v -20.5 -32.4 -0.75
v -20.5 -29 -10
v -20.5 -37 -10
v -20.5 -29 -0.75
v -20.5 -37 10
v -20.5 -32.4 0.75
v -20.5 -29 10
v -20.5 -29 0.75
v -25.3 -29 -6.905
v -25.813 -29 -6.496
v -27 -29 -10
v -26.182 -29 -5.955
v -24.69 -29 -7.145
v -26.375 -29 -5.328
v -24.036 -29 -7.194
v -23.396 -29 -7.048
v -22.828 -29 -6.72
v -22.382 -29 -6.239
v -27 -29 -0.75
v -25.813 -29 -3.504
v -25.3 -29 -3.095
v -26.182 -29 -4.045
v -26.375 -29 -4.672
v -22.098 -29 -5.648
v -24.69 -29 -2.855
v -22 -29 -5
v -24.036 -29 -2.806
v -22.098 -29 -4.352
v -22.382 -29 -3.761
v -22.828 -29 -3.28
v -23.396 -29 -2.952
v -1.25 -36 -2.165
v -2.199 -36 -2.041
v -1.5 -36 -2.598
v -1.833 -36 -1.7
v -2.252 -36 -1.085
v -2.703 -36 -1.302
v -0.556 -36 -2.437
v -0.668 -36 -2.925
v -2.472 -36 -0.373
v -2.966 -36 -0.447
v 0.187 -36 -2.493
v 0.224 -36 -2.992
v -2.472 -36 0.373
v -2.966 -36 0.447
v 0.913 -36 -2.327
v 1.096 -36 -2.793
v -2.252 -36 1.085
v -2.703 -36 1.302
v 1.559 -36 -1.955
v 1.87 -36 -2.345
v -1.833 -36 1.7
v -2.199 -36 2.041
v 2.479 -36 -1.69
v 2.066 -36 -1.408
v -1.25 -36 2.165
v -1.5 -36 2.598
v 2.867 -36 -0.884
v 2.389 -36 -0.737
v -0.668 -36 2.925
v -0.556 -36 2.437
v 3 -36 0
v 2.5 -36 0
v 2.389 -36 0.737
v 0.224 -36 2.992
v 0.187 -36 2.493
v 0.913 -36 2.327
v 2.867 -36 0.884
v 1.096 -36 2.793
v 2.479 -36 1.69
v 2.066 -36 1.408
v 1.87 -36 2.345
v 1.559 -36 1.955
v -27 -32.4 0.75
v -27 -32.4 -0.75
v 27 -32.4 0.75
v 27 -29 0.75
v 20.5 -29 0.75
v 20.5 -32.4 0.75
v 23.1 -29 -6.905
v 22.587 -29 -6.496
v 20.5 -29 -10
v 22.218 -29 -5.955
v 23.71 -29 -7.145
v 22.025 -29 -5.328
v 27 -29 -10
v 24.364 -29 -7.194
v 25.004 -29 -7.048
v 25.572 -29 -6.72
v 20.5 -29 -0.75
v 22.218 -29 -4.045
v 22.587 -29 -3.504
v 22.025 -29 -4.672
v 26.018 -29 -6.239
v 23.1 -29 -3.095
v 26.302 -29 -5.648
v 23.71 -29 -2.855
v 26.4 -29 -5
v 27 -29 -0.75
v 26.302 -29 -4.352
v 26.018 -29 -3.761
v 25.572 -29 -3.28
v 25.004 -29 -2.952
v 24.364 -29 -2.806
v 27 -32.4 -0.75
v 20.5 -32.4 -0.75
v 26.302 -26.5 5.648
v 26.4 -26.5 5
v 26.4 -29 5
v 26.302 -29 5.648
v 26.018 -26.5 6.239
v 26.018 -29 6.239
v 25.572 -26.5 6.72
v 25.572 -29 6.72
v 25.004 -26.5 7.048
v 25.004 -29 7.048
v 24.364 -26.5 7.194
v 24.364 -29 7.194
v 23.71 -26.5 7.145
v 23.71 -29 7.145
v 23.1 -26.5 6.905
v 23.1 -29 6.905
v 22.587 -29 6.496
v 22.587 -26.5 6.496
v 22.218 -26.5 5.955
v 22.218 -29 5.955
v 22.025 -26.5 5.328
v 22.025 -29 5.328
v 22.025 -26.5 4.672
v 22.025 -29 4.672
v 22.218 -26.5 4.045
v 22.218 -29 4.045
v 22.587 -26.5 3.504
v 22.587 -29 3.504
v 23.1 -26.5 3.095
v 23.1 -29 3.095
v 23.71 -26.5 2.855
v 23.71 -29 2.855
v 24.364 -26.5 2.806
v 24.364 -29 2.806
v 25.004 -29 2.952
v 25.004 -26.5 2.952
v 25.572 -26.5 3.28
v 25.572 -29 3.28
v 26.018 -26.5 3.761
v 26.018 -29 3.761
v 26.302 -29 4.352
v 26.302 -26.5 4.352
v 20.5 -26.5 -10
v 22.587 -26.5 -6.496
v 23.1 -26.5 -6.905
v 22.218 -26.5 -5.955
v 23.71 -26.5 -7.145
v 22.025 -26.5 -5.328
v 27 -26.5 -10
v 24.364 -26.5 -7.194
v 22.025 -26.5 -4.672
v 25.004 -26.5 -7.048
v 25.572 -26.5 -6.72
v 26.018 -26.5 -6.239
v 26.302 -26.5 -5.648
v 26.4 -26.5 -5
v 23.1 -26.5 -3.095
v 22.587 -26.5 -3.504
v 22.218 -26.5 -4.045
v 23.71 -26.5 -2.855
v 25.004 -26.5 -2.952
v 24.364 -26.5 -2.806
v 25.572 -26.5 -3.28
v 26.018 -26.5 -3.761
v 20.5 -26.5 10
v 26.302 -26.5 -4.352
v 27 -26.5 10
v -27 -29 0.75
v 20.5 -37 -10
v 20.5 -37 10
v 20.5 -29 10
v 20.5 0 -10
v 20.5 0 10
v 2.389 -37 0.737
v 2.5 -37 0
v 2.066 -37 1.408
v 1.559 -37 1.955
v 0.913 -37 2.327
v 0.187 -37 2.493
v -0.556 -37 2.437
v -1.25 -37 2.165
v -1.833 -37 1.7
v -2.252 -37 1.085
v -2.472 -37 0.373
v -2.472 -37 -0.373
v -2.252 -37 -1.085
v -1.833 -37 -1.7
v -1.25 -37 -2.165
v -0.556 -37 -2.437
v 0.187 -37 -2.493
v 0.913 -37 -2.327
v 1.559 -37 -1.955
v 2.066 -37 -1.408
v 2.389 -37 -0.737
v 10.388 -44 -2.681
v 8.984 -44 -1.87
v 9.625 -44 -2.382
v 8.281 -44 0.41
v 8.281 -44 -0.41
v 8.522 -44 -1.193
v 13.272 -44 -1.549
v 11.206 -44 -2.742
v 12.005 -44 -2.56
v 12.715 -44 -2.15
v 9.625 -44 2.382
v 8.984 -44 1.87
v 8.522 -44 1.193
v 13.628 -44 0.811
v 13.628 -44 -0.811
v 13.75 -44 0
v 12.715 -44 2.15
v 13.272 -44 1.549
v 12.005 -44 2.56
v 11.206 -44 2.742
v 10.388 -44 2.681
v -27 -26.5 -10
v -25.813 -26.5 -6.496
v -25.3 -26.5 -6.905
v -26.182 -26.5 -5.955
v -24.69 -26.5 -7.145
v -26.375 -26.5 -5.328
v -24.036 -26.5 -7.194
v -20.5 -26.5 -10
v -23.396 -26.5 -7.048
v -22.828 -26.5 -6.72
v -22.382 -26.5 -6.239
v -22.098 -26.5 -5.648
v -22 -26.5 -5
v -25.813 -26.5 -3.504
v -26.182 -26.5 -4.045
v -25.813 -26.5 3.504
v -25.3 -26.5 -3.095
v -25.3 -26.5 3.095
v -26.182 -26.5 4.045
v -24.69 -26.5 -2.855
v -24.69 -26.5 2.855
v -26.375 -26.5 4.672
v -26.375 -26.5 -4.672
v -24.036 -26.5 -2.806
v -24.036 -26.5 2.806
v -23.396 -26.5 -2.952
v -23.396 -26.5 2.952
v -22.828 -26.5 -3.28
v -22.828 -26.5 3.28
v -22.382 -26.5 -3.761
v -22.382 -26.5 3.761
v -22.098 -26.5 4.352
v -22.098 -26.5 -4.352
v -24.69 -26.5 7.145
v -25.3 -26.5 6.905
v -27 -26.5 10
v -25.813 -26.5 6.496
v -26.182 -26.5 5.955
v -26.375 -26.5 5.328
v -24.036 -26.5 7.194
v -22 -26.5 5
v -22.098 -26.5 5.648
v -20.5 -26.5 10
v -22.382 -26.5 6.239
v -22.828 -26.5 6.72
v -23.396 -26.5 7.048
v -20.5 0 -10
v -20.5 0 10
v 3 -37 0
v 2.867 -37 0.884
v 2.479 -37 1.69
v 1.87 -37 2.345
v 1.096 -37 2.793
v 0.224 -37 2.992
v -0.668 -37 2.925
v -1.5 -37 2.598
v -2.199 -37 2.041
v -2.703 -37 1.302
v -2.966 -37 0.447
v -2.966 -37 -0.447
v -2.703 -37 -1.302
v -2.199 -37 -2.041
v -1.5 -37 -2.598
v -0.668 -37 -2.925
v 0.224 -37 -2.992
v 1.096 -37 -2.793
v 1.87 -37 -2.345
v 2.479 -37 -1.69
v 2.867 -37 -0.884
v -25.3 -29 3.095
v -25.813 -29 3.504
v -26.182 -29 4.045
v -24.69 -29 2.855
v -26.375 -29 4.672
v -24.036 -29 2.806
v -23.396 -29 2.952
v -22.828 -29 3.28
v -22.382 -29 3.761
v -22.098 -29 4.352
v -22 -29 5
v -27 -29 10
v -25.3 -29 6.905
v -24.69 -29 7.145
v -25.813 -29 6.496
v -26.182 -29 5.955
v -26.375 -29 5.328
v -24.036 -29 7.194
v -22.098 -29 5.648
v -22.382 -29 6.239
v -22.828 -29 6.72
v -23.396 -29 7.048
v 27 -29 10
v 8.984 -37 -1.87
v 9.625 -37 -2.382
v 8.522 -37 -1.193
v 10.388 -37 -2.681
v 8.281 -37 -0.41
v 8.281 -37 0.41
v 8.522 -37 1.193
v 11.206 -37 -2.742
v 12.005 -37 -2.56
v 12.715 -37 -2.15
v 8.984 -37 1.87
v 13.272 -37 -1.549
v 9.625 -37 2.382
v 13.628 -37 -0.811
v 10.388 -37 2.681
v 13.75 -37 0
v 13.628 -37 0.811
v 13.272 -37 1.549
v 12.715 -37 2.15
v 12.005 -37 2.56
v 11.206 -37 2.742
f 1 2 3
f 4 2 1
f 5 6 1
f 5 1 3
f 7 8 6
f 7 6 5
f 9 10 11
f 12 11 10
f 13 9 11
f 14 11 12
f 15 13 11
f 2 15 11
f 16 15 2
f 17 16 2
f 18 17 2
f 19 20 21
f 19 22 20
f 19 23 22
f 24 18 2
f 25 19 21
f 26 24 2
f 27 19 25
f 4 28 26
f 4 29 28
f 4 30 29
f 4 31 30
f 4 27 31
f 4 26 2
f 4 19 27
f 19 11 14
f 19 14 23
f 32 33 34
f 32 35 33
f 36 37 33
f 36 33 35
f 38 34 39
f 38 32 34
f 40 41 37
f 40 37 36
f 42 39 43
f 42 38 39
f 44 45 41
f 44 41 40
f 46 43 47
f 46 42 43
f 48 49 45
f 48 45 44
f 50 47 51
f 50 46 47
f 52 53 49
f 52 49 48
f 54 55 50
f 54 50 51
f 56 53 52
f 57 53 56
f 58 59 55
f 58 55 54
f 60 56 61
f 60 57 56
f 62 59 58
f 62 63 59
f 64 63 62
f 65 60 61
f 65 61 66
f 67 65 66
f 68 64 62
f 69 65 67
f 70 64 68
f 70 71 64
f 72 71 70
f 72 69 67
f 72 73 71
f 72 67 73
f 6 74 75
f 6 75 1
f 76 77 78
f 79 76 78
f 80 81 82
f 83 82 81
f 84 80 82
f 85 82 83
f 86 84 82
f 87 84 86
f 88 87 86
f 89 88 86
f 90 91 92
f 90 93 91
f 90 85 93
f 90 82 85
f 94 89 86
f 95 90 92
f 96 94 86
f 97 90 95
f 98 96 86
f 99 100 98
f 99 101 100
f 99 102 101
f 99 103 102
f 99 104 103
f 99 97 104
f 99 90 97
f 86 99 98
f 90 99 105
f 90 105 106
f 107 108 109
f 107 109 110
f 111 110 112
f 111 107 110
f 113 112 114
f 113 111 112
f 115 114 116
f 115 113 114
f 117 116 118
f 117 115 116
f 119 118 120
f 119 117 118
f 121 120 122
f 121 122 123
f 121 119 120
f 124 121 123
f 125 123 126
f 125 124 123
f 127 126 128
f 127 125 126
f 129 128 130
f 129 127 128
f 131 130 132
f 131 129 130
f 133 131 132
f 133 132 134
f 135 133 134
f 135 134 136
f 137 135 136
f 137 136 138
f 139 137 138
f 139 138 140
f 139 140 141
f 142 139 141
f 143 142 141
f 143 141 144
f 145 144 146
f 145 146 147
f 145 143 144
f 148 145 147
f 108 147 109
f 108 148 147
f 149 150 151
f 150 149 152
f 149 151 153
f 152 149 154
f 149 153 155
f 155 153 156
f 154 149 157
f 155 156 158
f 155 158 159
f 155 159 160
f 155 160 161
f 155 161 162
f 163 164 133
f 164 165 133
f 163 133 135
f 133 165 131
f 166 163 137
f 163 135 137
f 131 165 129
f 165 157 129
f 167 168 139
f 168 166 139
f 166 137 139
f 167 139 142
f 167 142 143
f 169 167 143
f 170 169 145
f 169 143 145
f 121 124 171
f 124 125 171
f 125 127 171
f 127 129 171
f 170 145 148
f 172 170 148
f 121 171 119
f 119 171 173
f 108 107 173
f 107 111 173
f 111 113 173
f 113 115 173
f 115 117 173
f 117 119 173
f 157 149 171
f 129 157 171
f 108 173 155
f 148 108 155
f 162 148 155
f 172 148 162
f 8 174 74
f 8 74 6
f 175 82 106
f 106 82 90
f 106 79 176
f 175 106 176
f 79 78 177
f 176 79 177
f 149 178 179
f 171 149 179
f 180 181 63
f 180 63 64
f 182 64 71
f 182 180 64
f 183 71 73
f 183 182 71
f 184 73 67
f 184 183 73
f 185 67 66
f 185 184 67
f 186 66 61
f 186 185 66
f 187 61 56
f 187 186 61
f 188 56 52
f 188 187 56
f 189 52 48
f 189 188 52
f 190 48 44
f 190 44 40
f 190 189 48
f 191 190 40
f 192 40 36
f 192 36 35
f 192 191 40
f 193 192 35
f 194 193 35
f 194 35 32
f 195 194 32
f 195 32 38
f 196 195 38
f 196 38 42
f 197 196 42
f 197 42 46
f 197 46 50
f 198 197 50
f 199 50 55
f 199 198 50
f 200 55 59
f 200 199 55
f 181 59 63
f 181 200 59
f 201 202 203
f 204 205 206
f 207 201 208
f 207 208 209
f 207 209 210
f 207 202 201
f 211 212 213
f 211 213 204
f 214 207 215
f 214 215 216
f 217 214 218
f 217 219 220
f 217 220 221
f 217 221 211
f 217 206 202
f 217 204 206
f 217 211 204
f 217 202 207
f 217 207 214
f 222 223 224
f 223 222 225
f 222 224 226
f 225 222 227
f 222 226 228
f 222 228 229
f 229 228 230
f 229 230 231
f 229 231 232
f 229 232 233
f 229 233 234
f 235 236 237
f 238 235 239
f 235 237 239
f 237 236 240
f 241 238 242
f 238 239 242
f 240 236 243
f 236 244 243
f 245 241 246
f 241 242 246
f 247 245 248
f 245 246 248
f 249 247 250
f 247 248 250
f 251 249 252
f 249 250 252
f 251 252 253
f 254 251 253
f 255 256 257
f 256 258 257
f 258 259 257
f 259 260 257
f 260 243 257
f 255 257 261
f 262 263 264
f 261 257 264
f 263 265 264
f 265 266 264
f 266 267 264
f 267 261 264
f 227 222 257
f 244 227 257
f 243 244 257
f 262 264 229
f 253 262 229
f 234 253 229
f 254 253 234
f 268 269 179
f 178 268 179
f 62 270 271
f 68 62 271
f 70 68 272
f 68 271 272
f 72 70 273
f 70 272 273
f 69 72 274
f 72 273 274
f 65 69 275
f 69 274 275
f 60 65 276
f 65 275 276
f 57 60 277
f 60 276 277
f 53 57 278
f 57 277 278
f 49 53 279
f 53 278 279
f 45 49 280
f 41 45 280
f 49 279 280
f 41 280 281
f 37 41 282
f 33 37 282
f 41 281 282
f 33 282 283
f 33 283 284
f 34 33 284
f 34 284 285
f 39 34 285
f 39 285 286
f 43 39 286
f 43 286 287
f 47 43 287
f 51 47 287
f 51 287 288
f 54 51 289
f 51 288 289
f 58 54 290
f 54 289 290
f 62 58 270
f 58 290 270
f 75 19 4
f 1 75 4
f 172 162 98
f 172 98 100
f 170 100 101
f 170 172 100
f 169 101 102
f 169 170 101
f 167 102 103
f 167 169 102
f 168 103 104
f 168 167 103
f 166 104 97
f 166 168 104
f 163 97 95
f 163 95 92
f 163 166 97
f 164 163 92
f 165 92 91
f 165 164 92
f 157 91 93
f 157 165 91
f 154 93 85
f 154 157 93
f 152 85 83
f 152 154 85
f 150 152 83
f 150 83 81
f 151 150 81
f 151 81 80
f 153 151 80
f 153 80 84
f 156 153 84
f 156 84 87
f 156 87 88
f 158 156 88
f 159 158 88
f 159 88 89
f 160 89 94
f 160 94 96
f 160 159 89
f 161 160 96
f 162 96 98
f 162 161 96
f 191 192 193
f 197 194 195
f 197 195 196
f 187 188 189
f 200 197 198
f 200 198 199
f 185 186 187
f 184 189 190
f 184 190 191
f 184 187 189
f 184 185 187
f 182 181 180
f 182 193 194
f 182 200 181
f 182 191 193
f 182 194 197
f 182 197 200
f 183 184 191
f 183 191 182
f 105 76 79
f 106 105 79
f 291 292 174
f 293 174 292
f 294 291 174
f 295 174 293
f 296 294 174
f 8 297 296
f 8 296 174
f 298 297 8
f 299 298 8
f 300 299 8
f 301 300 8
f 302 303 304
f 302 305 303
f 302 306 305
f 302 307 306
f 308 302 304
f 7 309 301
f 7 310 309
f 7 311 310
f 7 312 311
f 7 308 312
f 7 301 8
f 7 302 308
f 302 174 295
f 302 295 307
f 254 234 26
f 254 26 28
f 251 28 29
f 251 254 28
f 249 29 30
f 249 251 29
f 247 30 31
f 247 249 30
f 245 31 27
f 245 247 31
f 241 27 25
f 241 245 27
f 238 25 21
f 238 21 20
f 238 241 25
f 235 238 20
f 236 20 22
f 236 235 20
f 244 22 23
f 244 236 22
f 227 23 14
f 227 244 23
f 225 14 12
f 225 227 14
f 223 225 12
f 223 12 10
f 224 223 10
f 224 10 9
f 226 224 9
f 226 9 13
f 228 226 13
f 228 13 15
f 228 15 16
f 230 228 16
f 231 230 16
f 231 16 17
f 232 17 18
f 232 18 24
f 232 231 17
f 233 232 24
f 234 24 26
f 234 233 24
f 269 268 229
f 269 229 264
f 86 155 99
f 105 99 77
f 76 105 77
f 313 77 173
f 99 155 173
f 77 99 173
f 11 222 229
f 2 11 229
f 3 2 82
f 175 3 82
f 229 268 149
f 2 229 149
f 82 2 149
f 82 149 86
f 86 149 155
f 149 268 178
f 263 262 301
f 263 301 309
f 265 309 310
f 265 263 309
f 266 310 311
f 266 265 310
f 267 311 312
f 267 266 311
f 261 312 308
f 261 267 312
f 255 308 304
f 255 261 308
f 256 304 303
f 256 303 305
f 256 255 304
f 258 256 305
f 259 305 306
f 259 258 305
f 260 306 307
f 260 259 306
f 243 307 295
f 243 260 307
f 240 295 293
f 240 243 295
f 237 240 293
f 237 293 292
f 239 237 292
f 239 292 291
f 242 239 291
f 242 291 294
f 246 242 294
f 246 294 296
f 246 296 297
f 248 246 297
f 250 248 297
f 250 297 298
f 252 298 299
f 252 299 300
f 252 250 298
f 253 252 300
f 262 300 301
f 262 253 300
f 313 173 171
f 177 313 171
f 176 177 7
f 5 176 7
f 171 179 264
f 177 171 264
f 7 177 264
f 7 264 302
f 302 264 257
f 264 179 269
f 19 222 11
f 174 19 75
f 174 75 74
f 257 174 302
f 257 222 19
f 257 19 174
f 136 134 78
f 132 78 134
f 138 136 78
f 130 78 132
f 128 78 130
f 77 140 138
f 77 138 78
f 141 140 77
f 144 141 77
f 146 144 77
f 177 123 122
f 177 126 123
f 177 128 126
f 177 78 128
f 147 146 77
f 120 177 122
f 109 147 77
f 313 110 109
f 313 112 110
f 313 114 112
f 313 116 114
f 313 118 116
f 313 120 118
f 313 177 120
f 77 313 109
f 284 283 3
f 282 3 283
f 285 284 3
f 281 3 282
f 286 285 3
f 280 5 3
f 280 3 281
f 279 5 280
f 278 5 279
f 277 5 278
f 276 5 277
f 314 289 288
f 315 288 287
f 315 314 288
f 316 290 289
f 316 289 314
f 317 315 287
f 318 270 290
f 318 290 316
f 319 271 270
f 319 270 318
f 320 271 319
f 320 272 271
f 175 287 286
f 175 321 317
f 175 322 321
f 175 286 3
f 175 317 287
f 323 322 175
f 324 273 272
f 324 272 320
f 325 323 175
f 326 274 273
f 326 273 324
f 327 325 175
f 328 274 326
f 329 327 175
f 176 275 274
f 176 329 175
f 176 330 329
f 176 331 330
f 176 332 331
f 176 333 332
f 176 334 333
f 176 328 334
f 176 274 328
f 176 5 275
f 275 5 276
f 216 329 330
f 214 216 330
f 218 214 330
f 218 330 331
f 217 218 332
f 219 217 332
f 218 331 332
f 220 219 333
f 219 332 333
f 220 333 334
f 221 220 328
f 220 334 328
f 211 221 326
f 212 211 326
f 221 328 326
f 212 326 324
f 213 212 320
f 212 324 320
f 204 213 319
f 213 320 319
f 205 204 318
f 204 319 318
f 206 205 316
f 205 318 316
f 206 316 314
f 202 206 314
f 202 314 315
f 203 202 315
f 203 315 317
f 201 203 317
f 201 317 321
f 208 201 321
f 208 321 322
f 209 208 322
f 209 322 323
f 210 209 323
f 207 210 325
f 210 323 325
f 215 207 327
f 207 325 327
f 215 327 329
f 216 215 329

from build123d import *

# Parameters (mm, degrees)
F0_W      = 41
F0_H      = 20
F1_DEPTH  = 26.5
F2_W      = 6.5
F2_H      = 20
F2_R      = 2.2
F2_W_2    = 41
F3_DEPTH  = 2.5
F4_W      = 41
F4_H      = 20
F5_DEPTH  = 8
F6_W      = 6.5
F6_H      = 1.5
F7_DEPTH  = 3.4
F8_R      = 2.75
F9_DEPTH  = 7
F10_R     = 3
F10_R_2   = 2.5
F11_DEPTH = 1


# Not quite as in the source:
# - a pattern or mirror of a feature is missing from the dataset's text; its kind, count and spacing are read off the source's solid


with BuildPart() as f1:
    # F0 (on Front) → F1 (new body)
    with BuildSketch(Plane.XZ):
        Rectangle(F0_W, F0_H)
    extrude(amount=F1_DEPTH)

    # F2 (on face) → F3 (join)
    with BuildSketch(Plane.XZ.offset(26.5)):
        with Locations((-23.75, 0)):
            Rectangle(F2_W, F2_H)
        with Locations((-24.2, -5)):
            Circle(F2_R, mode=Mode.SUBTRACT)
        with Locations((-24.2, 5)):
            Circle(F2_R, mode=Mode.SUBTRACT)
        with Locations((23.75, 0)):
            Rectangle(F2_W, F2_H)
        with Locations((24.2, -5)):
            Circle(F2_R, mode=Mode.SUBTRACT)
        with Locations((24.2, 5)):
            Circle(F2_R, mode=Mode.SUBTRACT)
        Rectangle(F2_W_2, F2_H)
    extrude(amount=F3_DEPTH)

    # F4 (on face) → F5 (join)
    with BuildSketch(Plane.XZ.offset(29)):
        Rectangle(F4_W, F4_H)
    extrude(amount=F5_DEPTH)

    # F6 (on face) → F7 (join)
    with BuildSketch(Plane.XZ.offset(29)):
        with Locations((-23.75, 0)):
            Rectangle(F6_W, F6_H)
    f7 = extrude(amount=F7_DEPTH)

    # F7_copies: F7 across plane
    add(f7.mirror(Plane(origin=(0, 0, 0), x_dir=(0, 0, 1), z_dir=(1, 0, 0))))

    # F8 (on face) → F9 (join)
    with BuildSketch(Plane.XZ.offset(37)):
        with Locations((11, 0)):
            Circle(F8_R)
    extrude(amount=F9_DEPTH)

    # F10 (on face) → F11 (cut)
    with BuildSketch(Plane.XZ.offset(37)):
        Circle(F10_R)
        Circle(F10_R_2, mode=Mode.SUBTRACT)
    extrude(amount=-F11_DEPTH, mode=Mode.SUBTRACT)


solid = f1.part
